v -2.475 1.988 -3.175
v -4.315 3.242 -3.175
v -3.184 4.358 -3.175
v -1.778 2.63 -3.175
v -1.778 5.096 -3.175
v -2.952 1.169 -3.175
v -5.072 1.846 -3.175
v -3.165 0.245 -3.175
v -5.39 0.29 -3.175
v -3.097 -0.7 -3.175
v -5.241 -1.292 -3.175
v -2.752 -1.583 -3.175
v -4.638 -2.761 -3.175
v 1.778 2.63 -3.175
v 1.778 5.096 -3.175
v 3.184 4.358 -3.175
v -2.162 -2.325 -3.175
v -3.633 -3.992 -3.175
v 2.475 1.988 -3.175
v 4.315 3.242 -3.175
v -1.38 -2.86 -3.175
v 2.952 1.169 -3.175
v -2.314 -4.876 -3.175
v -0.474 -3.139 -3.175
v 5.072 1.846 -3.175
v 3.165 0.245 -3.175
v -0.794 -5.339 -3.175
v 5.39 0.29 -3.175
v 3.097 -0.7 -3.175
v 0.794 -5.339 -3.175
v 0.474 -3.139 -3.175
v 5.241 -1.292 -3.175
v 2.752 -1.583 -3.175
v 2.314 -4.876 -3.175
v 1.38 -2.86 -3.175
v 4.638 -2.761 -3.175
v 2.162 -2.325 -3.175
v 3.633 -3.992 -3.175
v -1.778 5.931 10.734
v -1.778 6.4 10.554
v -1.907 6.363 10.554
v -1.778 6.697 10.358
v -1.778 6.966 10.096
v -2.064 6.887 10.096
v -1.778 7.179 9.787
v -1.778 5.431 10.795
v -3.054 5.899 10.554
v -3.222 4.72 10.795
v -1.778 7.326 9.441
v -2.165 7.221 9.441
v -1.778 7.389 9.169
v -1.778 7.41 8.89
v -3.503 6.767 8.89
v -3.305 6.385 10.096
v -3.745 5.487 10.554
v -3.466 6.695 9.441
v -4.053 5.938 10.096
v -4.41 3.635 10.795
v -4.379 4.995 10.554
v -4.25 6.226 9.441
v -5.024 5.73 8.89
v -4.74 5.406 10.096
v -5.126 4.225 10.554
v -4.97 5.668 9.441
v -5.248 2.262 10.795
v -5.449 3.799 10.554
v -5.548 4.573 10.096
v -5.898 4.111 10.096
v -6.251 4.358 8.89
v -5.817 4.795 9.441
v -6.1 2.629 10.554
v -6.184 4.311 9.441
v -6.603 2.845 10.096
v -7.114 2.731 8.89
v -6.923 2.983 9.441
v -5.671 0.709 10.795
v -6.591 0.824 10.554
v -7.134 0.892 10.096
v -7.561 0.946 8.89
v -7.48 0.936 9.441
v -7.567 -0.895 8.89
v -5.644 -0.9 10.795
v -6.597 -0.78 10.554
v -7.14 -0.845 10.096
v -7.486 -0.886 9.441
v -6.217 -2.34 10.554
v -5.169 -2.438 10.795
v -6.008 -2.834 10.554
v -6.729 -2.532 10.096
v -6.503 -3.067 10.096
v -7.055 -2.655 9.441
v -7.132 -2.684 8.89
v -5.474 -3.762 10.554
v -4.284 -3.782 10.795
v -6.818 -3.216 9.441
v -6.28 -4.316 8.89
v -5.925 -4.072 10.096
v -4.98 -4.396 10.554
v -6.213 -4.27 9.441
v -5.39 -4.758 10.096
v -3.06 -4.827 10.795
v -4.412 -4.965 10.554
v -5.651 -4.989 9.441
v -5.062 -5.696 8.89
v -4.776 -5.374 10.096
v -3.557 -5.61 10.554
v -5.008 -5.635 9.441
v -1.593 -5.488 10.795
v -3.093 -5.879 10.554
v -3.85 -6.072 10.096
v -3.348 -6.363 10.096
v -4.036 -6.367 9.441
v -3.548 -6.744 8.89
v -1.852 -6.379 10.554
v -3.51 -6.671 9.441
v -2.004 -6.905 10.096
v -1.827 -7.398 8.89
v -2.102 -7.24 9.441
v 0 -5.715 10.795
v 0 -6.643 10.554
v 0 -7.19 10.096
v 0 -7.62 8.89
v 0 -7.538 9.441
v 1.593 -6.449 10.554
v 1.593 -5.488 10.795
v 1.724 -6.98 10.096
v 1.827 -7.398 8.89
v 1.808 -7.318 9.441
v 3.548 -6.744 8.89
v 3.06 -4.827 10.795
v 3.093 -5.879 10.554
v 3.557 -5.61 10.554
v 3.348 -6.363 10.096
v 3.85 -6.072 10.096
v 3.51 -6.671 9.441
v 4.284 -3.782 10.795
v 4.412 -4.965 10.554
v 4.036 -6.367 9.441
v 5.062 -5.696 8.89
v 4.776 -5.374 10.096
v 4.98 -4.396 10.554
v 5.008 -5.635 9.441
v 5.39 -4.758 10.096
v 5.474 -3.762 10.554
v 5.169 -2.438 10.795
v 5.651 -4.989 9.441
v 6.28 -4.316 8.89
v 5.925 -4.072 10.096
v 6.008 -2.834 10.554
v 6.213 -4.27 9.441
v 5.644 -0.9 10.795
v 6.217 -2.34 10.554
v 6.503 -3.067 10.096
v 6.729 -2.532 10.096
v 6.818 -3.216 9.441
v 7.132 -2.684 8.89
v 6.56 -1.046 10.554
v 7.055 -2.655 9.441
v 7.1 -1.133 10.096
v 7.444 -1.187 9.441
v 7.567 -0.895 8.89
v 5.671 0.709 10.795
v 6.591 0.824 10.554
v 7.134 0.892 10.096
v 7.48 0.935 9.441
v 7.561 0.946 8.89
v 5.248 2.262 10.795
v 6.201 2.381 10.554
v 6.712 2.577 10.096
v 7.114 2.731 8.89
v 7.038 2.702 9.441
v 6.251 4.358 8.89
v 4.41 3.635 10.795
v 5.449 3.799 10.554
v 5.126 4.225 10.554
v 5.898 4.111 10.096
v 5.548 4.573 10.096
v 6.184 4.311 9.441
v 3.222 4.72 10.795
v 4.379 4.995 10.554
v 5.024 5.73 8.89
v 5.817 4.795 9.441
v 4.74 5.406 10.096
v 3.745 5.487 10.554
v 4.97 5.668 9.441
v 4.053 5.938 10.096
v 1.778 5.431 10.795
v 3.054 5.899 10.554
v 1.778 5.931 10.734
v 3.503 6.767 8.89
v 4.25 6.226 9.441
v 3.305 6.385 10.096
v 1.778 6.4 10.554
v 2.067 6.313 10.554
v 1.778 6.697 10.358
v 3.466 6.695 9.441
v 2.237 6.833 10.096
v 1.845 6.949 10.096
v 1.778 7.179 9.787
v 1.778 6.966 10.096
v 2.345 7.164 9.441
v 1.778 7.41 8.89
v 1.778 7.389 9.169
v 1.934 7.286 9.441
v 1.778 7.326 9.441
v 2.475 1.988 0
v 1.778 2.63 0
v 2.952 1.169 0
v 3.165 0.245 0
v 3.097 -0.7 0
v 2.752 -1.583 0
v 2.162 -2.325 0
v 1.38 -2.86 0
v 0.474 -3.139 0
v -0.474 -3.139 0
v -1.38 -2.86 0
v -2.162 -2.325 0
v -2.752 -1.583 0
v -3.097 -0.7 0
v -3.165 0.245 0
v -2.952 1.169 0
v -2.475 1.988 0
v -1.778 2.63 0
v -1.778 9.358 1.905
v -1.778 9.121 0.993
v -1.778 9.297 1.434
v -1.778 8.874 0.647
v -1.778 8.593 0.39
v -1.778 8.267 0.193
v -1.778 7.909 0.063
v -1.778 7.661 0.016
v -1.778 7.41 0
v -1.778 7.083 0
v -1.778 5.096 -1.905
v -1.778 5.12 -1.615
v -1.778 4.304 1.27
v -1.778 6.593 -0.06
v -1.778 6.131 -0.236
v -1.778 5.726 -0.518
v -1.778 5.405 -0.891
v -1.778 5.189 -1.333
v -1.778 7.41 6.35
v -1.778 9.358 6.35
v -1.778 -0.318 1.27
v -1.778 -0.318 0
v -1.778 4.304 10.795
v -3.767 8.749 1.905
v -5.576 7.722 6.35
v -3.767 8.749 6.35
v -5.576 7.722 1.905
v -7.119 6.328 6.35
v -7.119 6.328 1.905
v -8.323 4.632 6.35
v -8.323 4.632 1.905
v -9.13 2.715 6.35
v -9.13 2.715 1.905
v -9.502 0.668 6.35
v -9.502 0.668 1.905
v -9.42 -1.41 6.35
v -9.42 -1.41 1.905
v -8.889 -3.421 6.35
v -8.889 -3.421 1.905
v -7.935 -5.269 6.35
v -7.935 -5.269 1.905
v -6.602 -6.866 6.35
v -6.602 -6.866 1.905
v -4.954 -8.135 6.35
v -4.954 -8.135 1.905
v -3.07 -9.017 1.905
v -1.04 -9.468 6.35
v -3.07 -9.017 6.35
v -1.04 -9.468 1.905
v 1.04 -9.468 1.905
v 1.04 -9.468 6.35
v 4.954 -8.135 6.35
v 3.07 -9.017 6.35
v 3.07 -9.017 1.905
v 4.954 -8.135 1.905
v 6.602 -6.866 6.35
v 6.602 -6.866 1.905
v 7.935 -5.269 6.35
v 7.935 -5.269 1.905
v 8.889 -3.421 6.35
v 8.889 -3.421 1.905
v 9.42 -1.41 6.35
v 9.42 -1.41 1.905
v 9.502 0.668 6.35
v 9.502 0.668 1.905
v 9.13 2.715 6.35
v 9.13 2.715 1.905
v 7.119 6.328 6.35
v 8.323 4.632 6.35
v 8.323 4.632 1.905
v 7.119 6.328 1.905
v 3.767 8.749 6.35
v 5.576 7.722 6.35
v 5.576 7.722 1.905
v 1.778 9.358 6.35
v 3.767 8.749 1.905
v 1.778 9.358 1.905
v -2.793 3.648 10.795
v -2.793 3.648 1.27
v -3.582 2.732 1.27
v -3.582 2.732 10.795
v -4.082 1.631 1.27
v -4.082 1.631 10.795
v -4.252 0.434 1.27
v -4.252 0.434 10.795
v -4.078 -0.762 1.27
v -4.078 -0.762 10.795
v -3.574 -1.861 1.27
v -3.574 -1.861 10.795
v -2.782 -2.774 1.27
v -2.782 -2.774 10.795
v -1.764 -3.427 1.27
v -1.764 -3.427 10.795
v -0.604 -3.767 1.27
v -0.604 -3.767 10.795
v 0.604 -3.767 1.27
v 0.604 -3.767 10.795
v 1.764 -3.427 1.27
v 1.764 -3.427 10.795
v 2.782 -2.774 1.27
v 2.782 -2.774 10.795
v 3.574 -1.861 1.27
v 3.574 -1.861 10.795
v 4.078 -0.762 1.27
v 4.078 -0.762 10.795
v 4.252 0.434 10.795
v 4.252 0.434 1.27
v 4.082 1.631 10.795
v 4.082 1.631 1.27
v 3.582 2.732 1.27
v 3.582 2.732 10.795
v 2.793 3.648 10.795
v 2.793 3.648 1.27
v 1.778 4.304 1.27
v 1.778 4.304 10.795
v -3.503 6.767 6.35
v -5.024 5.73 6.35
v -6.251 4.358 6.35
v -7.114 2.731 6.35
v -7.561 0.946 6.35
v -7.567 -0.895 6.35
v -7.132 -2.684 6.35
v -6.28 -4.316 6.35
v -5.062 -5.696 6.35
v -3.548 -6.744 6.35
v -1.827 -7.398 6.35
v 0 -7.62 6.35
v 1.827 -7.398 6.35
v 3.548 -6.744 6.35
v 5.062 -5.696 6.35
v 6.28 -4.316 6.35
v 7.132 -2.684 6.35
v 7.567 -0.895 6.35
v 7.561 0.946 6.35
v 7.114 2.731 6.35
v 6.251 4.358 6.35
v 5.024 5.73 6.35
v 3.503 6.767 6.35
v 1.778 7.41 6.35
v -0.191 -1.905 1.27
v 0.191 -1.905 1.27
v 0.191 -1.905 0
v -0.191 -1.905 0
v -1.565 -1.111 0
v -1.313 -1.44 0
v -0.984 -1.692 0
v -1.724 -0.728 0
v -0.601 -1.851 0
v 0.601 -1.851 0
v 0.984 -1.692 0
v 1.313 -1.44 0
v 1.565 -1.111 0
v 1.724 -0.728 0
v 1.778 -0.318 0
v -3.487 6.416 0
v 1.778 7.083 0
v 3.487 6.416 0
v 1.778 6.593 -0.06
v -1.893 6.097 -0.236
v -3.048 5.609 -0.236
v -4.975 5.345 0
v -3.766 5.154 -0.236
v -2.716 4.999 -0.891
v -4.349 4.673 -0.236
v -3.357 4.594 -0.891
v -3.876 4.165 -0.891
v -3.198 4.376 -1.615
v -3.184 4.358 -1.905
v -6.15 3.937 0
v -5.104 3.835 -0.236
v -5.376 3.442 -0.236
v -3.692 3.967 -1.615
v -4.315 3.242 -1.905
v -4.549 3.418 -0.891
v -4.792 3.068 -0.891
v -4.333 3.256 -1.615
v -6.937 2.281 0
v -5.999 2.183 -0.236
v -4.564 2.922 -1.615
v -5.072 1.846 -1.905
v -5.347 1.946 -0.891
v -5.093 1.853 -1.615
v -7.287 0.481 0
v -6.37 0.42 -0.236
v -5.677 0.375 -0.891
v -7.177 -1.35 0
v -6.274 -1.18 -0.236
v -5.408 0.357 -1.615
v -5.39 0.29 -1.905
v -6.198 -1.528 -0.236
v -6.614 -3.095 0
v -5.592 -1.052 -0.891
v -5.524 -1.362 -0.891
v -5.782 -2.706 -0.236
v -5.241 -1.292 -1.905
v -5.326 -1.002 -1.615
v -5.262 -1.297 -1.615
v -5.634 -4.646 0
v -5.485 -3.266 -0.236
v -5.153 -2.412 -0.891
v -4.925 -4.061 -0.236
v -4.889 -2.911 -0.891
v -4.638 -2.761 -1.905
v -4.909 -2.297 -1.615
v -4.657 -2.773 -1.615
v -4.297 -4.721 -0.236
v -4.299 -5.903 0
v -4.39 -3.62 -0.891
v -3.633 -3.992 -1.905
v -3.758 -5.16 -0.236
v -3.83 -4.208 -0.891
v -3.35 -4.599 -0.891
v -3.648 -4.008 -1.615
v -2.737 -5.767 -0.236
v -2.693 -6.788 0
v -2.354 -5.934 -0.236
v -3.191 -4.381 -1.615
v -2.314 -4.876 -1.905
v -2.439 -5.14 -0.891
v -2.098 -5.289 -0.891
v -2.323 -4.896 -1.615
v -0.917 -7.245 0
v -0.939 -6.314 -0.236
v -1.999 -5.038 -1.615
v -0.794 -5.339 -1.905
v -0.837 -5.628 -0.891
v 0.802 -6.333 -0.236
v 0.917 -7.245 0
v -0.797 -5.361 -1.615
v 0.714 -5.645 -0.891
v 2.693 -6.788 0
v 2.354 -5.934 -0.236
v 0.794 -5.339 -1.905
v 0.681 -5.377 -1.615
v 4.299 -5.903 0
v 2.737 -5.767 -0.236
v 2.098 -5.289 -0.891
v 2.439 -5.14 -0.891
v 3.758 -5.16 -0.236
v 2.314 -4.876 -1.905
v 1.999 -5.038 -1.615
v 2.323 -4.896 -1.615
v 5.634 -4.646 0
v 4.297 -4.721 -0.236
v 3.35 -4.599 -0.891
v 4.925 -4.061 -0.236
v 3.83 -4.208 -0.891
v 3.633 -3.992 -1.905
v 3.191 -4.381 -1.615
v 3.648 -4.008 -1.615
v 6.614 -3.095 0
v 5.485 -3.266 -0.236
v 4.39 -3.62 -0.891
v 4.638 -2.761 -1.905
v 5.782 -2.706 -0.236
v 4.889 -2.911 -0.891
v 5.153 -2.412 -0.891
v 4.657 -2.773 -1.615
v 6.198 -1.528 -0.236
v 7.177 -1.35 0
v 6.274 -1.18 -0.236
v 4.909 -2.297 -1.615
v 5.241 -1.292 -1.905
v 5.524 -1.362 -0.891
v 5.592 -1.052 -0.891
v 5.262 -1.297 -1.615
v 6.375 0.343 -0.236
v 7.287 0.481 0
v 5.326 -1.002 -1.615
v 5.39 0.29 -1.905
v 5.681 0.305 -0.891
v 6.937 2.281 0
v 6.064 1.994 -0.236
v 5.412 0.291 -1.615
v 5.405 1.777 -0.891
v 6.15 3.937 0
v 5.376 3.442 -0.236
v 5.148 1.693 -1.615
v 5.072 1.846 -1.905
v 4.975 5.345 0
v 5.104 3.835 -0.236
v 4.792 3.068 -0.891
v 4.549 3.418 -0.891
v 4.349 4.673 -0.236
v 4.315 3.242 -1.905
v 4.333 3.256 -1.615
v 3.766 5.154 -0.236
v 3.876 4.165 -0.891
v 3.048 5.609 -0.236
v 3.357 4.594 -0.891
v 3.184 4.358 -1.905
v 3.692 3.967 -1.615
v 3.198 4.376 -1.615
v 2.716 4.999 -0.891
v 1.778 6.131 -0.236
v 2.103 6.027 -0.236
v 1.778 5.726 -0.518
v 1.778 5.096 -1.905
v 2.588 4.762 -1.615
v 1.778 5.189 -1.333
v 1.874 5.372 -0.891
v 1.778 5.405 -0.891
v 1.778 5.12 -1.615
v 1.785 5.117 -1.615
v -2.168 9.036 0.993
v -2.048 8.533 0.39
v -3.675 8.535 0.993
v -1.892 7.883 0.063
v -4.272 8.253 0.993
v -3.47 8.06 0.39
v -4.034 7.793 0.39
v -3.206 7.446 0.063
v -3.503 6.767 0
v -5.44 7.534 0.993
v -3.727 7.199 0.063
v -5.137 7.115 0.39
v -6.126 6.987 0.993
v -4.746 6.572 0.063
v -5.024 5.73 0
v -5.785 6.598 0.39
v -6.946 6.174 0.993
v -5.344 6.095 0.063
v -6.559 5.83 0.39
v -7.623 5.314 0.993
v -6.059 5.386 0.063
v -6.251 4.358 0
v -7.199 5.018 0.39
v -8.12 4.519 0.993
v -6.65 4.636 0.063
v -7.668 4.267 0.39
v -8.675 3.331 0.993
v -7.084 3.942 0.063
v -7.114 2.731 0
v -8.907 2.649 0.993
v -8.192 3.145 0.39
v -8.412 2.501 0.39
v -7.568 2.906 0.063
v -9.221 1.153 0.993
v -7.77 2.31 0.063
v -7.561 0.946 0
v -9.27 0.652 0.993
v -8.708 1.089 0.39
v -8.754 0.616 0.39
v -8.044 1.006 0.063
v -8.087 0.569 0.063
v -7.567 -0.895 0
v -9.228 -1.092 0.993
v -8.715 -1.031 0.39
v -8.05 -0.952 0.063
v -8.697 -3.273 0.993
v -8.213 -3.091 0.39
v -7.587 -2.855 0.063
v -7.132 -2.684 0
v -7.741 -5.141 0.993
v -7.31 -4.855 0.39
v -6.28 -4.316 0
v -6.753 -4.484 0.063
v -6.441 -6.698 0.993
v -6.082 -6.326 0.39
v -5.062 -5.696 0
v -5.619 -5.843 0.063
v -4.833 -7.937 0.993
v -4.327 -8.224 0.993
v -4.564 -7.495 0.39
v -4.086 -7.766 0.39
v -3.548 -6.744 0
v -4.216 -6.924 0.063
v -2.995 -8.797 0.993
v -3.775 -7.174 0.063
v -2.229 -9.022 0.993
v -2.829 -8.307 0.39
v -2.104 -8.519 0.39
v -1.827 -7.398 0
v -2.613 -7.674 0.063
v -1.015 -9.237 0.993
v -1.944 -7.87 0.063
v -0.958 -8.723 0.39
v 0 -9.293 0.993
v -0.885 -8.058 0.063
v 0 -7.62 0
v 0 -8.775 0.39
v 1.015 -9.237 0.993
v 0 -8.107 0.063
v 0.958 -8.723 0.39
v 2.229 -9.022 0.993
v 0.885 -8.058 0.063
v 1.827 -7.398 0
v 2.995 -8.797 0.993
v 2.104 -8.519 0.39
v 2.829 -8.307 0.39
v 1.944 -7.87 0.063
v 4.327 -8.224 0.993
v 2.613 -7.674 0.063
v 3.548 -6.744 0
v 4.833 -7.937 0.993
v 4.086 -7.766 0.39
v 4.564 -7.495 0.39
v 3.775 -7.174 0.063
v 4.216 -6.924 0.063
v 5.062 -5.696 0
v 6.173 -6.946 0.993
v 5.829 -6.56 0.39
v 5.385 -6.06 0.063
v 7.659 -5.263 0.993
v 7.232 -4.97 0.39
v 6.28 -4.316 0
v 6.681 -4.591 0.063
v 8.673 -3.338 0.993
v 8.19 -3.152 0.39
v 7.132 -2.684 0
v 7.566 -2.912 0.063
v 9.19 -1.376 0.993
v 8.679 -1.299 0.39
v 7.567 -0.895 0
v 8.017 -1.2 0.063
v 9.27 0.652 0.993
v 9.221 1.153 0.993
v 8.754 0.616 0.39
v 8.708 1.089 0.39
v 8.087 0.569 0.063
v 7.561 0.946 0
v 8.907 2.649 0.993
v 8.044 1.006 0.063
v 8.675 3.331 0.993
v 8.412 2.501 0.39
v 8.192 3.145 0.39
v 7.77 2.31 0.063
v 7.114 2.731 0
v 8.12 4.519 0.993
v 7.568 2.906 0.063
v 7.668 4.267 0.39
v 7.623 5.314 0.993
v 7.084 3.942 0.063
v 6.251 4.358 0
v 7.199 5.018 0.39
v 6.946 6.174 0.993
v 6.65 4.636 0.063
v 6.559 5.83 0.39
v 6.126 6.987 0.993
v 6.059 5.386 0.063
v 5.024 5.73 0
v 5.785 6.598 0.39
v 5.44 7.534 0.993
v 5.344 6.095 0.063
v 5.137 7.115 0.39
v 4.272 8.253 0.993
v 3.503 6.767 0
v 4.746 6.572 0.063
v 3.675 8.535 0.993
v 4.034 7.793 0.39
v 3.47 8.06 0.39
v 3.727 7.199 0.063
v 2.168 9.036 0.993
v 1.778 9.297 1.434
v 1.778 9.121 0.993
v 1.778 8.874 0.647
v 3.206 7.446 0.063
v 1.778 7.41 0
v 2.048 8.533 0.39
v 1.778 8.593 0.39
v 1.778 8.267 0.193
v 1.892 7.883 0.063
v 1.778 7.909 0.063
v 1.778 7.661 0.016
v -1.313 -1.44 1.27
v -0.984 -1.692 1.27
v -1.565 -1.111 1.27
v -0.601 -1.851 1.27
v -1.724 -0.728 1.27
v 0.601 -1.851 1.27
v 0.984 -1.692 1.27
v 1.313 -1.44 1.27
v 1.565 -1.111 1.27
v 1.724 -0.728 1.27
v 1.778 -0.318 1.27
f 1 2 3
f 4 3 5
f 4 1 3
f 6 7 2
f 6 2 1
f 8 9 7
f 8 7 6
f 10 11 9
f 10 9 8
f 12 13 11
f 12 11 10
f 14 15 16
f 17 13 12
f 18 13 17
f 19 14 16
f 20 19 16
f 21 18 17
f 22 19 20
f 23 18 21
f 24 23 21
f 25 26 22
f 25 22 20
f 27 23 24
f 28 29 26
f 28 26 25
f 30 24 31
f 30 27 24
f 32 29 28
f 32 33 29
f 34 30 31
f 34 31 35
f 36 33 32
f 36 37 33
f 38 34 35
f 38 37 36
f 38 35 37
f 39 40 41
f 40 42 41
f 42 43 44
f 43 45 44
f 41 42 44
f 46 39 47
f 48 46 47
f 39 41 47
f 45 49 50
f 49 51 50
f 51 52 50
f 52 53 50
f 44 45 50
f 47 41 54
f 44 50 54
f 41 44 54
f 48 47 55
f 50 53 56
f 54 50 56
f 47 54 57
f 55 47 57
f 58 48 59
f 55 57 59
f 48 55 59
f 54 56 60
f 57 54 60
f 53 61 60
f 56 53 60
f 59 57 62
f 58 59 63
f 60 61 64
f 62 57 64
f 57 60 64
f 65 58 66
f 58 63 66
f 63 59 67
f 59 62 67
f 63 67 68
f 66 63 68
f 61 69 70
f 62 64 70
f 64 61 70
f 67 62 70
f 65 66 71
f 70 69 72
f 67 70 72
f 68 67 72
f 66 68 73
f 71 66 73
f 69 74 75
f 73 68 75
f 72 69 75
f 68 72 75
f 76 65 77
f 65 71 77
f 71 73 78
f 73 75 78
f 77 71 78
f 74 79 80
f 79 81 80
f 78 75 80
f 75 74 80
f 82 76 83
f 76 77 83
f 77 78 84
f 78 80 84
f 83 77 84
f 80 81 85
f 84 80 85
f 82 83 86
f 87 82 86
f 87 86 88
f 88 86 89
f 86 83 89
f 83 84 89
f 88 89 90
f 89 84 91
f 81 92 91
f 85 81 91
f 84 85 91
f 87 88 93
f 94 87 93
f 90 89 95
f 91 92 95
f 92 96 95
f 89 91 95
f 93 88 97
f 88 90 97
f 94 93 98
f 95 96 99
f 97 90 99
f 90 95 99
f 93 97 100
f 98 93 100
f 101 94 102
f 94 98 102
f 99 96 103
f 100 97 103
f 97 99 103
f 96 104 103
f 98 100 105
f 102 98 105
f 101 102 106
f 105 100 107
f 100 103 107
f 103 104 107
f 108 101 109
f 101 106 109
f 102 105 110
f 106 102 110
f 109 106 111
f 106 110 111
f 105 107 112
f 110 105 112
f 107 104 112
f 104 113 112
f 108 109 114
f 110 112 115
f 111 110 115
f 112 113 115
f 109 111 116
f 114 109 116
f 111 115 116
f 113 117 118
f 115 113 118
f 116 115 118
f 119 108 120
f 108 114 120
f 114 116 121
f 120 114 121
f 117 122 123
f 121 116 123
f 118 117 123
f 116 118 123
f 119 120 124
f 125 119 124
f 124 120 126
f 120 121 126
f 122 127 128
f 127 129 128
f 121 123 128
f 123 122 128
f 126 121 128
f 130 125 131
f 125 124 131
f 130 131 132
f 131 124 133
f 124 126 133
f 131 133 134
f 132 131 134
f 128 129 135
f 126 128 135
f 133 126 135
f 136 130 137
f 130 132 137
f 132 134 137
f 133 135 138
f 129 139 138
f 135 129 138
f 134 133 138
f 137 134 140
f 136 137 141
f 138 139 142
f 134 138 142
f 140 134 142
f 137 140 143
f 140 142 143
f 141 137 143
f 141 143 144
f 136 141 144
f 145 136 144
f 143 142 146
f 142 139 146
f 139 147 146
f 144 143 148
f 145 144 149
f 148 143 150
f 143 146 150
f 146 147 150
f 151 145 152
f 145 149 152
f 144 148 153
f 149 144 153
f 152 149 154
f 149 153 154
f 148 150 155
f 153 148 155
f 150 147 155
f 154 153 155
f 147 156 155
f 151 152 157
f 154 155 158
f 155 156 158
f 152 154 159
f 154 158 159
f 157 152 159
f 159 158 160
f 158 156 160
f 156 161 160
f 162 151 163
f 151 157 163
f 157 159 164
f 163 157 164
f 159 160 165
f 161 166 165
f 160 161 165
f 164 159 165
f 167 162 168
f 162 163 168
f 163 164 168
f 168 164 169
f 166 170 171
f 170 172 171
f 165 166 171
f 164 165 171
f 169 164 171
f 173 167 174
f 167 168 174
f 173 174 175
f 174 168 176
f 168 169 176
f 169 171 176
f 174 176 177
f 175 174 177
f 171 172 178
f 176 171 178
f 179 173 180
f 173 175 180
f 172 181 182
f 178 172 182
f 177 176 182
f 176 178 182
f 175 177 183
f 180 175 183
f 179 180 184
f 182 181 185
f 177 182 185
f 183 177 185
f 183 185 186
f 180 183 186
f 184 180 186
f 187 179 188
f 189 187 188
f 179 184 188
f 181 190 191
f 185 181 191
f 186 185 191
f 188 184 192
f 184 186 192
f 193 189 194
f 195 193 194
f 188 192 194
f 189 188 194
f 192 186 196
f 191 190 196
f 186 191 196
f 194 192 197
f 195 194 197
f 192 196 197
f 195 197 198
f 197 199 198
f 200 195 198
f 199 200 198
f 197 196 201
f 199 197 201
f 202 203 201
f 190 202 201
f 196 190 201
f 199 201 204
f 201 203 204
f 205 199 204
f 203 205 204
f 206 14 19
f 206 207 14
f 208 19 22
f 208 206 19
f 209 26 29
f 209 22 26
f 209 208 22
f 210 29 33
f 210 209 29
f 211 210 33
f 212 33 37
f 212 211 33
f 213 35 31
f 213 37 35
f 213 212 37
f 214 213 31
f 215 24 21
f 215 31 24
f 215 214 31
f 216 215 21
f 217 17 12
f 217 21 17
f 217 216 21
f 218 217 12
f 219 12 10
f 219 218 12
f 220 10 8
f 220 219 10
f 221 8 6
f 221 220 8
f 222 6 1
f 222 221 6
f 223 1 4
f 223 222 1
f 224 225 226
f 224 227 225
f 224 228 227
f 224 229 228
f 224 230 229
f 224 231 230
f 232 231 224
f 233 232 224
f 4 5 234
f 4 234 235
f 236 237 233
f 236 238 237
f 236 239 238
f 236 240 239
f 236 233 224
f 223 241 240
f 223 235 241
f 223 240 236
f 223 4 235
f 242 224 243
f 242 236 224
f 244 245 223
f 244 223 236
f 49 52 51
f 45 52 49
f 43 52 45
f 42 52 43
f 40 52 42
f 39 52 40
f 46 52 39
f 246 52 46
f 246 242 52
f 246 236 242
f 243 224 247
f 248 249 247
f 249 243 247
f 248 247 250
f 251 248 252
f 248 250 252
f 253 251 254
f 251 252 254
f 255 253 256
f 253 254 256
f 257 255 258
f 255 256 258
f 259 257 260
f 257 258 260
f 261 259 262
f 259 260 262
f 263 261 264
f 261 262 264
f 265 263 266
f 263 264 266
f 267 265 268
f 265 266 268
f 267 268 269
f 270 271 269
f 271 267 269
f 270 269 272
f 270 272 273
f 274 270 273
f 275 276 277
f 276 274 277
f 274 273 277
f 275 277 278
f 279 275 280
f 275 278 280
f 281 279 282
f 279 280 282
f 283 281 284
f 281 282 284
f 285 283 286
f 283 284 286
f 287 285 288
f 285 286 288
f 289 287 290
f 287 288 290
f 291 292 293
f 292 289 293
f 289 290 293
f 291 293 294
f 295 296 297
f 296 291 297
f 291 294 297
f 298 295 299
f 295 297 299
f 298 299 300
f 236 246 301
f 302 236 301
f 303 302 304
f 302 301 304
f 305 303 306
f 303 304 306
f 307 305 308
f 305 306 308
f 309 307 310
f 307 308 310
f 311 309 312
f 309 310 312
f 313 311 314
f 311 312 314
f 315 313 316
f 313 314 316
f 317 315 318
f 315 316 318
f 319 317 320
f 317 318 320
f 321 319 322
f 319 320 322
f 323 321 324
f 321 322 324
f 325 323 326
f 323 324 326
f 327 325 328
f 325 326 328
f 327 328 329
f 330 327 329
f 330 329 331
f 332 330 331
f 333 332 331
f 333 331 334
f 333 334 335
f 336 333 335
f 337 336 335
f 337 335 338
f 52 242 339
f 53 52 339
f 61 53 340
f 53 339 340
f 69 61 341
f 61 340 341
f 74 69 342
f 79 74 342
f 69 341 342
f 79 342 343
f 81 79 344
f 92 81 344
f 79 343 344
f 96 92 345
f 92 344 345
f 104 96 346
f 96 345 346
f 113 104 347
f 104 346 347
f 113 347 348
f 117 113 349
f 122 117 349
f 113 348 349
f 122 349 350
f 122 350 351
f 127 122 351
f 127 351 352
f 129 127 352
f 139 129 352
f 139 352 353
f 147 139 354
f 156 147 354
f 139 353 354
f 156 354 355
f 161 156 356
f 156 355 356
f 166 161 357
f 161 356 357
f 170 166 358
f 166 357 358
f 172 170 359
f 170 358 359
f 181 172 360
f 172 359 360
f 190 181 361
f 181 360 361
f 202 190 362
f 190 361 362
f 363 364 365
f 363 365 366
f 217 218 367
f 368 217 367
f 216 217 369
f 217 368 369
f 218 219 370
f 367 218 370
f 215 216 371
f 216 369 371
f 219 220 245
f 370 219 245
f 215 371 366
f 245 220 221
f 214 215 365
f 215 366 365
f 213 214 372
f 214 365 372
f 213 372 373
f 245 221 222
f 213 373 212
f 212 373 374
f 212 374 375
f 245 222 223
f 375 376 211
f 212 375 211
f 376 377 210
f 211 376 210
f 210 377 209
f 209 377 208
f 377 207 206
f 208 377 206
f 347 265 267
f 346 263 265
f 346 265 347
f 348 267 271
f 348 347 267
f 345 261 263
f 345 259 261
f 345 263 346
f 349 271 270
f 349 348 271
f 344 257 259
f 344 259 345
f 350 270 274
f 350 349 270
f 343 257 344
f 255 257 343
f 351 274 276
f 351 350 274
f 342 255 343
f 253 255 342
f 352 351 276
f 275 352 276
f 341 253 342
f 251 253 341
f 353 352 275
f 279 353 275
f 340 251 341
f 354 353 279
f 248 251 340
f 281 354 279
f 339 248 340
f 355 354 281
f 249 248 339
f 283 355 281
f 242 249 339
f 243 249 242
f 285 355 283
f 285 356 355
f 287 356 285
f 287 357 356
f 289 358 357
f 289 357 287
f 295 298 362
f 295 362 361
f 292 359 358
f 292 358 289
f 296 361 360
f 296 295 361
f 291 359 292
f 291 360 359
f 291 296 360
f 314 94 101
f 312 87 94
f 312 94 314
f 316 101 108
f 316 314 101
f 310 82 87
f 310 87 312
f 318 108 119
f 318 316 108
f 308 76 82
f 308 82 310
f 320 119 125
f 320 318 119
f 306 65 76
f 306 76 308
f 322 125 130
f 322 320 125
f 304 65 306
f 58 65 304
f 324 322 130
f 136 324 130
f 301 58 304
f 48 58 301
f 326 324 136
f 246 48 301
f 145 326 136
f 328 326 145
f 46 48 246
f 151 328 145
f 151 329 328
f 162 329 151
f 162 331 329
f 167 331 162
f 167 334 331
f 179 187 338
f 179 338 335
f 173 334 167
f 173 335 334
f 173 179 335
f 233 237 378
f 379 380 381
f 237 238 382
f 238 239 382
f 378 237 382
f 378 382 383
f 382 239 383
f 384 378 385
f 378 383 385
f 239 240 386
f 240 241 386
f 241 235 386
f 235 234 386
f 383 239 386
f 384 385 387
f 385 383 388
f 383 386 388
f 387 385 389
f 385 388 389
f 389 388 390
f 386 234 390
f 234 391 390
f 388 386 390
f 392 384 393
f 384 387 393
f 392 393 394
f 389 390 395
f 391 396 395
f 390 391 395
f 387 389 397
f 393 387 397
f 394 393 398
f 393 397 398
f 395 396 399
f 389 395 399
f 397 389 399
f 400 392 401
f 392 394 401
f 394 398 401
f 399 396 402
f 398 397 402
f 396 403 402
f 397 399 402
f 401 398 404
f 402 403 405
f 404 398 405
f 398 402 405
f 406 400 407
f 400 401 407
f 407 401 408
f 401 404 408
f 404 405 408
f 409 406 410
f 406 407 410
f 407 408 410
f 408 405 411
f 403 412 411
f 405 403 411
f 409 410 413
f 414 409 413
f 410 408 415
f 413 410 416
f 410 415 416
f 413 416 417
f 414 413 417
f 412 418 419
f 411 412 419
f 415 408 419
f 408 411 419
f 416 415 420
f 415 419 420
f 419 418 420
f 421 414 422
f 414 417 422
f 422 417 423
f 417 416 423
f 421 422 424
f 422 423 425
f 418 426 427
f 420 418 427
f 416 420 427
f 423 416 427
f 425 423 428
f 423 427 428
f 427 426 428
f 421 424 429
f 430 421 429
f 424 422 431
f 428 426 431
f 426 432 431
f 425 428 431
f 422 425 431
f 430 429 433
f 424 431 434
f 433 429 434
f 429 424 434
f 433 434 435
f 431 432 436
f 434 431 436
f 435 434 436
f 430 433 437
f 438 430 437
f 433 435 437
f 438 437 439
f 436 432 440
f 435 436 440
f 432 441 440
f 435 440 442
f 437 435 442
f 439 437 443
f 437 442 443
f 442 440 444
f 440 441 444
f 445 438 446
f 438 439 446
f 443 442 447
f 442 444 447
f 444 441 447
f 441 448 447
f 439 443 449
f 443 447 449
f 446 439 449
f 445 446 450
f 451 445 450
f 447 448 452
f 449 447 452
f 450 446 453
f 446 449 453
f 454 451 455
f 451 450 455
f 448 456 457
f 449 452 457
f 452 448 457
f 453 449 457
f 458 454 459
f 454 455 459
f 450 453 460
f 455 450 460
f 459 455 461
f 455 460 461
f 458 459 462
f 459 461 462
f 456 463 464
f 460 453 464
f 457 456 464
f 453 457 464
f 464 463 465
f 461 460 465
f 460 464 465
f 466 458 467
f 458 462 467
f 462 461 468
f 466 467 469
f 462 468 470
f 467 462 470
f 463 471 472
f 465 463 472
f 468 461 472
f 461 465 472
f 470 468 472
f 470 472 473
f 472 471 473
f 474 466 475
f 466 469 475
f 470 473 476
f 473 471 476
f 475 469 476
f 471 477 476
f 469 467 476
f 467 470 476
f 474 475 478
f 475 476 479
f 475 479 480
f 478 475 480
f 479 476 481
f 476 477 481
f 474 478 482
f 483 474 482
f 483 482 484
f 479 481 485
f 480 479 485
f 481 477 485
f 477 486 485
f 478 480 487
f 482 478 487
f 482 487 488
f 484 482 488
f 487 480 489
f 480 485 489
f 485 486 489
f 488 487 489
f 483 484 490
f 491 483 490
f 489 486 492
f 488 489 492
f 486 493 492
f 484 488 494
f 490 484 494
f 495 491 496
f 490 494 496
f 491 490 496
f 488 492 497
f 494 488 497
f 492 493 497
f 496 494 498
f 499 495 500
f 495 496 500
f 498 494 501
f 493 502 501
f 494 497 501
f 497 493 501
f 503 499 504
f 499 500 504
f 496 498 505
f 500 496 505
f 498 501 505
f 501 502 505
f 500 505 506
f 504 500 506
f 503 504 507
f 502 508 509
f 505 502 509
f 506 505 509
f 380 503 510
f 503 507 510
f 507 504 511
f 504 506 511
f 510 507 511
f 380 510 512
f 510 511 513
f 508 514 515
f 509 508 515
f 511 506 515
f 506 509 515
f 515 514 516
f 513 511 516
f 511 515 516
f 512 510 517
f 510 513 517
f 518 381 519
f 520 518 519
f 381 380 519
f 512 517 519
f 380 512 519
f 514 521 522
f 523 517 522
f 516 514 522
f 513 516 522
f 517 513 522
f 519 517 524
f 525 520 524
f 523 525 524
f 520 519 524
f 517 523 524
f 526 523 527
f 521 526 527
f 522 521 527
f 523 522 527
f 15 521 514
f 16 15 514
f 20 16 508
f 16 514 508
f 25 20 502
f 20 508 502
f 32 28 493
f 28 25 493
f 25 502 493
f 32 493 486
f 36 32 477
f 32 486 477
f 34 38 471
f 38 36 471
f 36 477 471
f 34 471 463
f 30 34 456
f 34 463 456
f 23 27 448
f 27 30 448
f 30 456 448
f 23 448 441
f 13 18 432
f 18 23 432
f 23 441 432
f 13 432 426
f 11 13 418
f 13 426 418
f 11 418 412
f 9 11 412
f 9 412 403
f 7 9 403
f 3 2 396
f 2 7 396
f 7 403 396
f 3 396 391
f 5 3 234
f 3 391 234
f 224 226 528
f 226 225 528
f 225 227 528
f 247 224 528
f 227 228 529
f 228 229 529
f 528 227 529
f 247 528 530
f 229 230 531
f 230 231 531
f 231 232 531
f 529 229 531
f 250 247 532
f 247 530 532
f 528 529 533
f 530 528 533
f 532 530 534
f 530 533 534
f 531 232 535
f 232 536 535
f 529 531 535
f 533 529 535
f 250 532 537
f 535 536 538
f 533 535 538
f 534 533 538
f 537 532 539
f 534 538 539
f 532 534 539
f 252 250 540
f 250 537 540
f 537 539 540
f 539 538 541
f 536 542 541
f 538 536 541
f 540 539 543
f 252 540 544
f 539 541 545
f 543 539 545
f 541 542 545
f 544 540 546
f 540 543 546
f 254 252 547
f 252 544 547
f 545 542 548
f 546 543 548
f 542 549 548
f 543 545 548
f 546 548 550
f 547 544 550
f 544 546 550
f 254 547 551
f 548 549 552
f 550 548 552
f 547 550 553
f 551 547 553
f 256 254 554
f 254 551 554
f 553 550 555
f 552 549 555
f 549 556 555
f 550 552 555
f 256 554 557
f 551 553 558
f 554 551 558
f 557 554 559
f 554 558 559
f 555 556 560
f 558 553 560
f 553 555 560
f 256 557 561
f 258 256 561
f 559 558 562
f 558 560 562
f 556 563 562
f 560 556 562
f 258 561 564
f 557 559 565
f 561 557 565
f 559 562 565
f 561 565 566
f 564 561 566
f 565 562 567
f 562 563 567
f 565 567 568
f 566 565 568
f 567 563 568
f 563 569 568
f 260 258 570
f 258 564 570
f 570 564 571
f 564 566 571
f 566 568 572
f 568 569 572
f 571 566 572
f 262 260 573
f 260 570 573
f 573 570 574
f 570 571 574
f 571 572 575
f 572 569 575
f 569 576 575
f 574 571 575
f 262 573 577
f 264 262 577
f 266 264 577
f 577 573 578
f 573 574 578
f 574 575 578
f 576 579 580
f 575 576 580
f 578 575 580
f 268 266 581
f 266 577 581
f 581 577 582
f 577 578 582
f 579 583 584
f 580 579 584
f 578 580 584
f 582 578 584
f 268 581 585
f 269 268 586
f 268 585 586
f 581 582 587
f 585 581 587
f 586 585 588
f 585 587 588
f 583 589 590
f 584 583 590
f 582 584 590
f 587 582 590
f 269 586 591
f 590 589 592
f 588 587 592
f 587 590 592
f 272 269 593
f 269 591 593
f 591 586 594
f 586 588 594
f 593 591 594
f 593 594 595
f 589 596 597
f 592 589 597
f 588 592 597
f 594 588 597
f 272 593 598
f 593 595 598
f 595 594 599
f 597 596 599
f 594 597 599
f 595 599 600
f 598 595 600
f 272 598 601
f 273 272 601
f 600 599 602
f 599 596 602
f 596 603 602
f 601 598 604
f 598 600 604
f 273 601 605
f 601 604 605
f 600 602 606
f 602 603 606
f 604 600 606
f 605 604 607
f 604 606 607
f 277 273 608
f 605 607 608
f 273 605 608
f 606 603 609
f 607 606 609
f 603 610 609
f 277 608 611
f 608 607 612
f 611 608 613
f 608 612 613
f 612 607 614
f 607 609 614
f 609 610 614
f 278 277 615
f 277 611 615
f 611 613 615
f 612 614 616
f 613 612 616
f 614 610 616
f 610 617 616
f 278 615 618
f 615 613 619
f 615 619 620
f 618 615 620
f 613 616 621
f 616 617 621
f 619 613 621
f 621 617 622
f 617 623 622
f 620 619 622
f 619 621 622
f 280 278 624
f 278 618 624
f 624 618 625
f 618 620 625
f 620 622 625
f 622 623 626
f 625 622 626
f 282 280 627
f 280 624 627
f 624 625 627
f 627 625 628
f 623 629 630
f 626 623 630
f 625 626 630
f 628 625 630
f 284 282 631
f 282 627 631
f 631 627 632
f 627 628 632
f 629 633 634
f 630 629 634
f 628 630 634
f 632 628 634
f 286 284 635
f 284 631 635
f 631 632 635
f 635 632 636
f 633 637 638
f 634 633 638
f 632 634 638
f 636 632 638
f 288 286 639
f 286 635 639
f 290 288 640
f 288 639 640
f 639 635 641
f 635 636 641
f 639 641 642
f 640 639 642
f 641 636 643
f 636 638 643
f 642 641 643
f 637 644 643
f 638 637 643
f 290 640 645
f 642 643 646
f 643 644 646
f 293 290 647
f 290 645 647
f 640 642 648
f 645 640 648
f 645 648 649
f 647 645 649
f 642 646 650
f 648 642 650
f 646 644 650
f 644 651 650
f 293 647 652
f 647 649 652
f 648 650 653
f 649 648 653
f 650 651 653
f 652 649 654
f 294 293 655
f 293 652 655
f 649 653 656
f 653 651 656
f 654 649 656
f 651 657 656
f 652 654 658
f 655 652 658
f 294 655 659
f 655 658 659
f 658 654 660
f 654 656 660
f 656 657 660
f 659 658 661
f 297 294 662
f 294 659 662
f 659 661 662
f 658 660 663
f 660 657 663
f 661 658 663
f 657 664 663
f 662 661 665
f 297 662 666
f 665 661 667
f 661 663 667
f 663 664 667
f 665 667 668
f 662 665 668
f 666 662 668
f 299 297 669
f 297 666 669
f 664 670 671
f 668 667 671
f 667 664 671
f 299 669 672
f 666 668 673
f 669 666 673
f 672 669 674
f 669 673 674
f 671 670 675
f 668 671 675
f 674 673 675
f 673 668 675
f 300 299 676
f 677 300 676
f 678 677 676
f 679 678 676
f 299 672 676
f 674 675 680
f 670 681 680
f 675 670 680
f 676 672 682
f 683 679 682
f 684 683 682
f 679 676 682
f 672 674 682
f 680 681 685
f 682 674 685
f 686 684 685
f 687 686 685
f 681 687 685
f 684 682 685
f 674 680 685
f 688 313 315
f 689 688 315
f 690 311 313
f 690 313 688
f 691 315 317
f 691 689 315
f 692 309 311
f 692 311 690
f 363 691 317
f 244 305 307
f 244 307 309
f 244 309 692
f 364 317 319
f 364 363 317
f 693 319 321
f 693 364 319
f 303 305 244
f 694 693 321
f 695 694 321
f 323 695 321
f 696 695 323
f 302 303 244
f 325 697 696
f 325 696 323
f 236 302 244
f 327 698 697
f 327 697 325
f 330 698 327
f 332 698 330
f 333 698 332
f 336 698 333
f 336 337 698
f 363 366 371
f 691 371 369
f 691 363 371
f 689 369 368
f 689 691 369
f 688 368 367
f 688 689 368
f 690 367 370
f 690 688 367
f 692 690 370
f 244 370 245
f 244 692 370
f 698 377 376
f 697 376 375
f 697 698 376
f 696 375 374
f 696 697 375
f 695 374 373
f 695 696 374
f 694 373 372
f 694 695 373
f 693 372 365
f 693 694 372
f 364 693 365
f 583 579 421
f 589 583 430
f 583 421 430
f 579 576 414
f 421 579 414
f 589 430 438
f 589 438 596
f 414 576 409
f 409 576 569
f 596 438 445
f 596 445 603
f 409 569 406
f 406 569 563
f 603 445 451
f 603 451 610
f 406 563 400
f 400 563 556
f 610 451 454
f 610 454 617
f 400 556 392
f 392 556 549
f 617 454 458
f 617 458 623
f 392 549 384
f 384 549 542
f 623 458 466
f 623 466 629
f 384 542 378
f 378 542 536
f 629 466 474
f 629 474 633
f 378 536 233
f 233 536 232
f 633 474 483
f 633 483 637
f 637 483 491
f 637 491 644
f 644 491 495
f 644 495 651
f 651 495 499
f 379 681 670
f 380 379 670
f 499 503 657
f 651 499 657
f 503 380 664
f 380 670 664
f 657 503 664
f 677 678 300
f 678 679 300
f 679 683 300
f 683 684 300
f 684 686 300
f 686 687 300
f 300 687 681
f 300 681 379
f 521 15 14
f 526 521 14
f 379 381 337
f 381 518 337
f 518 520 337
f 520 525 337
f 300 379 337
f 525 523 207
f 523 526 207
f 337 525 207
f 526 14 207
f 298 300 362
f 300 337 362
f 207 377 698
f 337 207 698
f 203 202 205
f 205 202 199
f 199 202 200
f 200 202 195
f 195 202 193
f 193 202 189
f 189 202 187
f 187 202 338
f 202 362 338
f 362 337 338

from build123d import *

# Parameters (mm, degrees)
F0_R      = 9.525
F1_DEPTH  = 6.35
F2_R      = 7.62
F3_DEPTH  = 4.445
F4_R      = 5.3975
F4_R_2    = 3.175
F5_DEPTH  = 3.175
F6_W      = 3.556
F6_H      = 25.4
F7_DEPTH  = 12.7
F8_W      = 3.556
F8_H      = 10.795
F9_DEPTH  = 1.905
F10_R     = 1.5875
F11_R     = 1.905
F12_R     = 4.251833
F13_DEPTH = 9.525


with BuildPart() as f1:
    # F0 (on Top) → F1 (new body)
    with BuildSketch(Plane.XY):
        Circle(F0_R)
    extrude(amount=F1_DEPTH)

    # F2 (on face) → F3 (join)
    with BuildSketch(Plane.XY.offset(6.35)):
        Circle(F2_R)
    extrude(amount=F3_DEPTH)

    # F4 (on face) → F5 (join)
    with BuildSketch(Plane(origin=(0, 0, 0), x_dir=(1, 0, 0), z_dir=(0, 0, -1))):
        Circle(F4_R)
        Circle(F4_R_2, mode=Mode.SUBTRACT)
    extrude(amount=F5_DEPTH)

    # F6 (on Front) → F7 (cut)
    with BuildSketch(Plane.XZ):
        with Locations((0, 0.635)):
            Rectangle(F6_W, F6_H)
    extrude(amount=-F7_DEPTH, mode=Mode.SUBTRACT)

    # F8 (on face) → F9 (cut)
    with BuildSketch(Plane(origin=(0, 0, 0), x_dir=(-1, 0, 0), z_dir=(0, 1, 0))):
        with Locations((0, 5.3975)):
            Rectangle(F8_W, F8_H)
    extrude(amount=-F9_DEPTH, mode=Mode.SUBTRACT)

    # F10
    f10_edges = [f1.edges().sort_by_distance(p)[0] for p in [
        (-1.778, -1.905, 5.3975),
        (1.778, -1.905, 5.3975),
    ]]
    fillet(f10_edges, radius=F10_R)

    # F11
    f11_edges = [f1.edges().sort_by_distance(p)[0] for p in [
        (0, -5.3975, 0),
        (0, -9.525, 0),
        (0, -7.62, 10.795),
    ]]
    fillet(f11_edges, radius=F11_R)

    # F12 (on face) → F13 (cut)
    with BuildSketch(Plane.XY.offset(10.795)):
        with Locations((0, 0.441833)):
            Circle(F12_R)
    extrude(amount=-F13_DEPTH, mode=Mode.SUBTRACT)


solid = f1.part
